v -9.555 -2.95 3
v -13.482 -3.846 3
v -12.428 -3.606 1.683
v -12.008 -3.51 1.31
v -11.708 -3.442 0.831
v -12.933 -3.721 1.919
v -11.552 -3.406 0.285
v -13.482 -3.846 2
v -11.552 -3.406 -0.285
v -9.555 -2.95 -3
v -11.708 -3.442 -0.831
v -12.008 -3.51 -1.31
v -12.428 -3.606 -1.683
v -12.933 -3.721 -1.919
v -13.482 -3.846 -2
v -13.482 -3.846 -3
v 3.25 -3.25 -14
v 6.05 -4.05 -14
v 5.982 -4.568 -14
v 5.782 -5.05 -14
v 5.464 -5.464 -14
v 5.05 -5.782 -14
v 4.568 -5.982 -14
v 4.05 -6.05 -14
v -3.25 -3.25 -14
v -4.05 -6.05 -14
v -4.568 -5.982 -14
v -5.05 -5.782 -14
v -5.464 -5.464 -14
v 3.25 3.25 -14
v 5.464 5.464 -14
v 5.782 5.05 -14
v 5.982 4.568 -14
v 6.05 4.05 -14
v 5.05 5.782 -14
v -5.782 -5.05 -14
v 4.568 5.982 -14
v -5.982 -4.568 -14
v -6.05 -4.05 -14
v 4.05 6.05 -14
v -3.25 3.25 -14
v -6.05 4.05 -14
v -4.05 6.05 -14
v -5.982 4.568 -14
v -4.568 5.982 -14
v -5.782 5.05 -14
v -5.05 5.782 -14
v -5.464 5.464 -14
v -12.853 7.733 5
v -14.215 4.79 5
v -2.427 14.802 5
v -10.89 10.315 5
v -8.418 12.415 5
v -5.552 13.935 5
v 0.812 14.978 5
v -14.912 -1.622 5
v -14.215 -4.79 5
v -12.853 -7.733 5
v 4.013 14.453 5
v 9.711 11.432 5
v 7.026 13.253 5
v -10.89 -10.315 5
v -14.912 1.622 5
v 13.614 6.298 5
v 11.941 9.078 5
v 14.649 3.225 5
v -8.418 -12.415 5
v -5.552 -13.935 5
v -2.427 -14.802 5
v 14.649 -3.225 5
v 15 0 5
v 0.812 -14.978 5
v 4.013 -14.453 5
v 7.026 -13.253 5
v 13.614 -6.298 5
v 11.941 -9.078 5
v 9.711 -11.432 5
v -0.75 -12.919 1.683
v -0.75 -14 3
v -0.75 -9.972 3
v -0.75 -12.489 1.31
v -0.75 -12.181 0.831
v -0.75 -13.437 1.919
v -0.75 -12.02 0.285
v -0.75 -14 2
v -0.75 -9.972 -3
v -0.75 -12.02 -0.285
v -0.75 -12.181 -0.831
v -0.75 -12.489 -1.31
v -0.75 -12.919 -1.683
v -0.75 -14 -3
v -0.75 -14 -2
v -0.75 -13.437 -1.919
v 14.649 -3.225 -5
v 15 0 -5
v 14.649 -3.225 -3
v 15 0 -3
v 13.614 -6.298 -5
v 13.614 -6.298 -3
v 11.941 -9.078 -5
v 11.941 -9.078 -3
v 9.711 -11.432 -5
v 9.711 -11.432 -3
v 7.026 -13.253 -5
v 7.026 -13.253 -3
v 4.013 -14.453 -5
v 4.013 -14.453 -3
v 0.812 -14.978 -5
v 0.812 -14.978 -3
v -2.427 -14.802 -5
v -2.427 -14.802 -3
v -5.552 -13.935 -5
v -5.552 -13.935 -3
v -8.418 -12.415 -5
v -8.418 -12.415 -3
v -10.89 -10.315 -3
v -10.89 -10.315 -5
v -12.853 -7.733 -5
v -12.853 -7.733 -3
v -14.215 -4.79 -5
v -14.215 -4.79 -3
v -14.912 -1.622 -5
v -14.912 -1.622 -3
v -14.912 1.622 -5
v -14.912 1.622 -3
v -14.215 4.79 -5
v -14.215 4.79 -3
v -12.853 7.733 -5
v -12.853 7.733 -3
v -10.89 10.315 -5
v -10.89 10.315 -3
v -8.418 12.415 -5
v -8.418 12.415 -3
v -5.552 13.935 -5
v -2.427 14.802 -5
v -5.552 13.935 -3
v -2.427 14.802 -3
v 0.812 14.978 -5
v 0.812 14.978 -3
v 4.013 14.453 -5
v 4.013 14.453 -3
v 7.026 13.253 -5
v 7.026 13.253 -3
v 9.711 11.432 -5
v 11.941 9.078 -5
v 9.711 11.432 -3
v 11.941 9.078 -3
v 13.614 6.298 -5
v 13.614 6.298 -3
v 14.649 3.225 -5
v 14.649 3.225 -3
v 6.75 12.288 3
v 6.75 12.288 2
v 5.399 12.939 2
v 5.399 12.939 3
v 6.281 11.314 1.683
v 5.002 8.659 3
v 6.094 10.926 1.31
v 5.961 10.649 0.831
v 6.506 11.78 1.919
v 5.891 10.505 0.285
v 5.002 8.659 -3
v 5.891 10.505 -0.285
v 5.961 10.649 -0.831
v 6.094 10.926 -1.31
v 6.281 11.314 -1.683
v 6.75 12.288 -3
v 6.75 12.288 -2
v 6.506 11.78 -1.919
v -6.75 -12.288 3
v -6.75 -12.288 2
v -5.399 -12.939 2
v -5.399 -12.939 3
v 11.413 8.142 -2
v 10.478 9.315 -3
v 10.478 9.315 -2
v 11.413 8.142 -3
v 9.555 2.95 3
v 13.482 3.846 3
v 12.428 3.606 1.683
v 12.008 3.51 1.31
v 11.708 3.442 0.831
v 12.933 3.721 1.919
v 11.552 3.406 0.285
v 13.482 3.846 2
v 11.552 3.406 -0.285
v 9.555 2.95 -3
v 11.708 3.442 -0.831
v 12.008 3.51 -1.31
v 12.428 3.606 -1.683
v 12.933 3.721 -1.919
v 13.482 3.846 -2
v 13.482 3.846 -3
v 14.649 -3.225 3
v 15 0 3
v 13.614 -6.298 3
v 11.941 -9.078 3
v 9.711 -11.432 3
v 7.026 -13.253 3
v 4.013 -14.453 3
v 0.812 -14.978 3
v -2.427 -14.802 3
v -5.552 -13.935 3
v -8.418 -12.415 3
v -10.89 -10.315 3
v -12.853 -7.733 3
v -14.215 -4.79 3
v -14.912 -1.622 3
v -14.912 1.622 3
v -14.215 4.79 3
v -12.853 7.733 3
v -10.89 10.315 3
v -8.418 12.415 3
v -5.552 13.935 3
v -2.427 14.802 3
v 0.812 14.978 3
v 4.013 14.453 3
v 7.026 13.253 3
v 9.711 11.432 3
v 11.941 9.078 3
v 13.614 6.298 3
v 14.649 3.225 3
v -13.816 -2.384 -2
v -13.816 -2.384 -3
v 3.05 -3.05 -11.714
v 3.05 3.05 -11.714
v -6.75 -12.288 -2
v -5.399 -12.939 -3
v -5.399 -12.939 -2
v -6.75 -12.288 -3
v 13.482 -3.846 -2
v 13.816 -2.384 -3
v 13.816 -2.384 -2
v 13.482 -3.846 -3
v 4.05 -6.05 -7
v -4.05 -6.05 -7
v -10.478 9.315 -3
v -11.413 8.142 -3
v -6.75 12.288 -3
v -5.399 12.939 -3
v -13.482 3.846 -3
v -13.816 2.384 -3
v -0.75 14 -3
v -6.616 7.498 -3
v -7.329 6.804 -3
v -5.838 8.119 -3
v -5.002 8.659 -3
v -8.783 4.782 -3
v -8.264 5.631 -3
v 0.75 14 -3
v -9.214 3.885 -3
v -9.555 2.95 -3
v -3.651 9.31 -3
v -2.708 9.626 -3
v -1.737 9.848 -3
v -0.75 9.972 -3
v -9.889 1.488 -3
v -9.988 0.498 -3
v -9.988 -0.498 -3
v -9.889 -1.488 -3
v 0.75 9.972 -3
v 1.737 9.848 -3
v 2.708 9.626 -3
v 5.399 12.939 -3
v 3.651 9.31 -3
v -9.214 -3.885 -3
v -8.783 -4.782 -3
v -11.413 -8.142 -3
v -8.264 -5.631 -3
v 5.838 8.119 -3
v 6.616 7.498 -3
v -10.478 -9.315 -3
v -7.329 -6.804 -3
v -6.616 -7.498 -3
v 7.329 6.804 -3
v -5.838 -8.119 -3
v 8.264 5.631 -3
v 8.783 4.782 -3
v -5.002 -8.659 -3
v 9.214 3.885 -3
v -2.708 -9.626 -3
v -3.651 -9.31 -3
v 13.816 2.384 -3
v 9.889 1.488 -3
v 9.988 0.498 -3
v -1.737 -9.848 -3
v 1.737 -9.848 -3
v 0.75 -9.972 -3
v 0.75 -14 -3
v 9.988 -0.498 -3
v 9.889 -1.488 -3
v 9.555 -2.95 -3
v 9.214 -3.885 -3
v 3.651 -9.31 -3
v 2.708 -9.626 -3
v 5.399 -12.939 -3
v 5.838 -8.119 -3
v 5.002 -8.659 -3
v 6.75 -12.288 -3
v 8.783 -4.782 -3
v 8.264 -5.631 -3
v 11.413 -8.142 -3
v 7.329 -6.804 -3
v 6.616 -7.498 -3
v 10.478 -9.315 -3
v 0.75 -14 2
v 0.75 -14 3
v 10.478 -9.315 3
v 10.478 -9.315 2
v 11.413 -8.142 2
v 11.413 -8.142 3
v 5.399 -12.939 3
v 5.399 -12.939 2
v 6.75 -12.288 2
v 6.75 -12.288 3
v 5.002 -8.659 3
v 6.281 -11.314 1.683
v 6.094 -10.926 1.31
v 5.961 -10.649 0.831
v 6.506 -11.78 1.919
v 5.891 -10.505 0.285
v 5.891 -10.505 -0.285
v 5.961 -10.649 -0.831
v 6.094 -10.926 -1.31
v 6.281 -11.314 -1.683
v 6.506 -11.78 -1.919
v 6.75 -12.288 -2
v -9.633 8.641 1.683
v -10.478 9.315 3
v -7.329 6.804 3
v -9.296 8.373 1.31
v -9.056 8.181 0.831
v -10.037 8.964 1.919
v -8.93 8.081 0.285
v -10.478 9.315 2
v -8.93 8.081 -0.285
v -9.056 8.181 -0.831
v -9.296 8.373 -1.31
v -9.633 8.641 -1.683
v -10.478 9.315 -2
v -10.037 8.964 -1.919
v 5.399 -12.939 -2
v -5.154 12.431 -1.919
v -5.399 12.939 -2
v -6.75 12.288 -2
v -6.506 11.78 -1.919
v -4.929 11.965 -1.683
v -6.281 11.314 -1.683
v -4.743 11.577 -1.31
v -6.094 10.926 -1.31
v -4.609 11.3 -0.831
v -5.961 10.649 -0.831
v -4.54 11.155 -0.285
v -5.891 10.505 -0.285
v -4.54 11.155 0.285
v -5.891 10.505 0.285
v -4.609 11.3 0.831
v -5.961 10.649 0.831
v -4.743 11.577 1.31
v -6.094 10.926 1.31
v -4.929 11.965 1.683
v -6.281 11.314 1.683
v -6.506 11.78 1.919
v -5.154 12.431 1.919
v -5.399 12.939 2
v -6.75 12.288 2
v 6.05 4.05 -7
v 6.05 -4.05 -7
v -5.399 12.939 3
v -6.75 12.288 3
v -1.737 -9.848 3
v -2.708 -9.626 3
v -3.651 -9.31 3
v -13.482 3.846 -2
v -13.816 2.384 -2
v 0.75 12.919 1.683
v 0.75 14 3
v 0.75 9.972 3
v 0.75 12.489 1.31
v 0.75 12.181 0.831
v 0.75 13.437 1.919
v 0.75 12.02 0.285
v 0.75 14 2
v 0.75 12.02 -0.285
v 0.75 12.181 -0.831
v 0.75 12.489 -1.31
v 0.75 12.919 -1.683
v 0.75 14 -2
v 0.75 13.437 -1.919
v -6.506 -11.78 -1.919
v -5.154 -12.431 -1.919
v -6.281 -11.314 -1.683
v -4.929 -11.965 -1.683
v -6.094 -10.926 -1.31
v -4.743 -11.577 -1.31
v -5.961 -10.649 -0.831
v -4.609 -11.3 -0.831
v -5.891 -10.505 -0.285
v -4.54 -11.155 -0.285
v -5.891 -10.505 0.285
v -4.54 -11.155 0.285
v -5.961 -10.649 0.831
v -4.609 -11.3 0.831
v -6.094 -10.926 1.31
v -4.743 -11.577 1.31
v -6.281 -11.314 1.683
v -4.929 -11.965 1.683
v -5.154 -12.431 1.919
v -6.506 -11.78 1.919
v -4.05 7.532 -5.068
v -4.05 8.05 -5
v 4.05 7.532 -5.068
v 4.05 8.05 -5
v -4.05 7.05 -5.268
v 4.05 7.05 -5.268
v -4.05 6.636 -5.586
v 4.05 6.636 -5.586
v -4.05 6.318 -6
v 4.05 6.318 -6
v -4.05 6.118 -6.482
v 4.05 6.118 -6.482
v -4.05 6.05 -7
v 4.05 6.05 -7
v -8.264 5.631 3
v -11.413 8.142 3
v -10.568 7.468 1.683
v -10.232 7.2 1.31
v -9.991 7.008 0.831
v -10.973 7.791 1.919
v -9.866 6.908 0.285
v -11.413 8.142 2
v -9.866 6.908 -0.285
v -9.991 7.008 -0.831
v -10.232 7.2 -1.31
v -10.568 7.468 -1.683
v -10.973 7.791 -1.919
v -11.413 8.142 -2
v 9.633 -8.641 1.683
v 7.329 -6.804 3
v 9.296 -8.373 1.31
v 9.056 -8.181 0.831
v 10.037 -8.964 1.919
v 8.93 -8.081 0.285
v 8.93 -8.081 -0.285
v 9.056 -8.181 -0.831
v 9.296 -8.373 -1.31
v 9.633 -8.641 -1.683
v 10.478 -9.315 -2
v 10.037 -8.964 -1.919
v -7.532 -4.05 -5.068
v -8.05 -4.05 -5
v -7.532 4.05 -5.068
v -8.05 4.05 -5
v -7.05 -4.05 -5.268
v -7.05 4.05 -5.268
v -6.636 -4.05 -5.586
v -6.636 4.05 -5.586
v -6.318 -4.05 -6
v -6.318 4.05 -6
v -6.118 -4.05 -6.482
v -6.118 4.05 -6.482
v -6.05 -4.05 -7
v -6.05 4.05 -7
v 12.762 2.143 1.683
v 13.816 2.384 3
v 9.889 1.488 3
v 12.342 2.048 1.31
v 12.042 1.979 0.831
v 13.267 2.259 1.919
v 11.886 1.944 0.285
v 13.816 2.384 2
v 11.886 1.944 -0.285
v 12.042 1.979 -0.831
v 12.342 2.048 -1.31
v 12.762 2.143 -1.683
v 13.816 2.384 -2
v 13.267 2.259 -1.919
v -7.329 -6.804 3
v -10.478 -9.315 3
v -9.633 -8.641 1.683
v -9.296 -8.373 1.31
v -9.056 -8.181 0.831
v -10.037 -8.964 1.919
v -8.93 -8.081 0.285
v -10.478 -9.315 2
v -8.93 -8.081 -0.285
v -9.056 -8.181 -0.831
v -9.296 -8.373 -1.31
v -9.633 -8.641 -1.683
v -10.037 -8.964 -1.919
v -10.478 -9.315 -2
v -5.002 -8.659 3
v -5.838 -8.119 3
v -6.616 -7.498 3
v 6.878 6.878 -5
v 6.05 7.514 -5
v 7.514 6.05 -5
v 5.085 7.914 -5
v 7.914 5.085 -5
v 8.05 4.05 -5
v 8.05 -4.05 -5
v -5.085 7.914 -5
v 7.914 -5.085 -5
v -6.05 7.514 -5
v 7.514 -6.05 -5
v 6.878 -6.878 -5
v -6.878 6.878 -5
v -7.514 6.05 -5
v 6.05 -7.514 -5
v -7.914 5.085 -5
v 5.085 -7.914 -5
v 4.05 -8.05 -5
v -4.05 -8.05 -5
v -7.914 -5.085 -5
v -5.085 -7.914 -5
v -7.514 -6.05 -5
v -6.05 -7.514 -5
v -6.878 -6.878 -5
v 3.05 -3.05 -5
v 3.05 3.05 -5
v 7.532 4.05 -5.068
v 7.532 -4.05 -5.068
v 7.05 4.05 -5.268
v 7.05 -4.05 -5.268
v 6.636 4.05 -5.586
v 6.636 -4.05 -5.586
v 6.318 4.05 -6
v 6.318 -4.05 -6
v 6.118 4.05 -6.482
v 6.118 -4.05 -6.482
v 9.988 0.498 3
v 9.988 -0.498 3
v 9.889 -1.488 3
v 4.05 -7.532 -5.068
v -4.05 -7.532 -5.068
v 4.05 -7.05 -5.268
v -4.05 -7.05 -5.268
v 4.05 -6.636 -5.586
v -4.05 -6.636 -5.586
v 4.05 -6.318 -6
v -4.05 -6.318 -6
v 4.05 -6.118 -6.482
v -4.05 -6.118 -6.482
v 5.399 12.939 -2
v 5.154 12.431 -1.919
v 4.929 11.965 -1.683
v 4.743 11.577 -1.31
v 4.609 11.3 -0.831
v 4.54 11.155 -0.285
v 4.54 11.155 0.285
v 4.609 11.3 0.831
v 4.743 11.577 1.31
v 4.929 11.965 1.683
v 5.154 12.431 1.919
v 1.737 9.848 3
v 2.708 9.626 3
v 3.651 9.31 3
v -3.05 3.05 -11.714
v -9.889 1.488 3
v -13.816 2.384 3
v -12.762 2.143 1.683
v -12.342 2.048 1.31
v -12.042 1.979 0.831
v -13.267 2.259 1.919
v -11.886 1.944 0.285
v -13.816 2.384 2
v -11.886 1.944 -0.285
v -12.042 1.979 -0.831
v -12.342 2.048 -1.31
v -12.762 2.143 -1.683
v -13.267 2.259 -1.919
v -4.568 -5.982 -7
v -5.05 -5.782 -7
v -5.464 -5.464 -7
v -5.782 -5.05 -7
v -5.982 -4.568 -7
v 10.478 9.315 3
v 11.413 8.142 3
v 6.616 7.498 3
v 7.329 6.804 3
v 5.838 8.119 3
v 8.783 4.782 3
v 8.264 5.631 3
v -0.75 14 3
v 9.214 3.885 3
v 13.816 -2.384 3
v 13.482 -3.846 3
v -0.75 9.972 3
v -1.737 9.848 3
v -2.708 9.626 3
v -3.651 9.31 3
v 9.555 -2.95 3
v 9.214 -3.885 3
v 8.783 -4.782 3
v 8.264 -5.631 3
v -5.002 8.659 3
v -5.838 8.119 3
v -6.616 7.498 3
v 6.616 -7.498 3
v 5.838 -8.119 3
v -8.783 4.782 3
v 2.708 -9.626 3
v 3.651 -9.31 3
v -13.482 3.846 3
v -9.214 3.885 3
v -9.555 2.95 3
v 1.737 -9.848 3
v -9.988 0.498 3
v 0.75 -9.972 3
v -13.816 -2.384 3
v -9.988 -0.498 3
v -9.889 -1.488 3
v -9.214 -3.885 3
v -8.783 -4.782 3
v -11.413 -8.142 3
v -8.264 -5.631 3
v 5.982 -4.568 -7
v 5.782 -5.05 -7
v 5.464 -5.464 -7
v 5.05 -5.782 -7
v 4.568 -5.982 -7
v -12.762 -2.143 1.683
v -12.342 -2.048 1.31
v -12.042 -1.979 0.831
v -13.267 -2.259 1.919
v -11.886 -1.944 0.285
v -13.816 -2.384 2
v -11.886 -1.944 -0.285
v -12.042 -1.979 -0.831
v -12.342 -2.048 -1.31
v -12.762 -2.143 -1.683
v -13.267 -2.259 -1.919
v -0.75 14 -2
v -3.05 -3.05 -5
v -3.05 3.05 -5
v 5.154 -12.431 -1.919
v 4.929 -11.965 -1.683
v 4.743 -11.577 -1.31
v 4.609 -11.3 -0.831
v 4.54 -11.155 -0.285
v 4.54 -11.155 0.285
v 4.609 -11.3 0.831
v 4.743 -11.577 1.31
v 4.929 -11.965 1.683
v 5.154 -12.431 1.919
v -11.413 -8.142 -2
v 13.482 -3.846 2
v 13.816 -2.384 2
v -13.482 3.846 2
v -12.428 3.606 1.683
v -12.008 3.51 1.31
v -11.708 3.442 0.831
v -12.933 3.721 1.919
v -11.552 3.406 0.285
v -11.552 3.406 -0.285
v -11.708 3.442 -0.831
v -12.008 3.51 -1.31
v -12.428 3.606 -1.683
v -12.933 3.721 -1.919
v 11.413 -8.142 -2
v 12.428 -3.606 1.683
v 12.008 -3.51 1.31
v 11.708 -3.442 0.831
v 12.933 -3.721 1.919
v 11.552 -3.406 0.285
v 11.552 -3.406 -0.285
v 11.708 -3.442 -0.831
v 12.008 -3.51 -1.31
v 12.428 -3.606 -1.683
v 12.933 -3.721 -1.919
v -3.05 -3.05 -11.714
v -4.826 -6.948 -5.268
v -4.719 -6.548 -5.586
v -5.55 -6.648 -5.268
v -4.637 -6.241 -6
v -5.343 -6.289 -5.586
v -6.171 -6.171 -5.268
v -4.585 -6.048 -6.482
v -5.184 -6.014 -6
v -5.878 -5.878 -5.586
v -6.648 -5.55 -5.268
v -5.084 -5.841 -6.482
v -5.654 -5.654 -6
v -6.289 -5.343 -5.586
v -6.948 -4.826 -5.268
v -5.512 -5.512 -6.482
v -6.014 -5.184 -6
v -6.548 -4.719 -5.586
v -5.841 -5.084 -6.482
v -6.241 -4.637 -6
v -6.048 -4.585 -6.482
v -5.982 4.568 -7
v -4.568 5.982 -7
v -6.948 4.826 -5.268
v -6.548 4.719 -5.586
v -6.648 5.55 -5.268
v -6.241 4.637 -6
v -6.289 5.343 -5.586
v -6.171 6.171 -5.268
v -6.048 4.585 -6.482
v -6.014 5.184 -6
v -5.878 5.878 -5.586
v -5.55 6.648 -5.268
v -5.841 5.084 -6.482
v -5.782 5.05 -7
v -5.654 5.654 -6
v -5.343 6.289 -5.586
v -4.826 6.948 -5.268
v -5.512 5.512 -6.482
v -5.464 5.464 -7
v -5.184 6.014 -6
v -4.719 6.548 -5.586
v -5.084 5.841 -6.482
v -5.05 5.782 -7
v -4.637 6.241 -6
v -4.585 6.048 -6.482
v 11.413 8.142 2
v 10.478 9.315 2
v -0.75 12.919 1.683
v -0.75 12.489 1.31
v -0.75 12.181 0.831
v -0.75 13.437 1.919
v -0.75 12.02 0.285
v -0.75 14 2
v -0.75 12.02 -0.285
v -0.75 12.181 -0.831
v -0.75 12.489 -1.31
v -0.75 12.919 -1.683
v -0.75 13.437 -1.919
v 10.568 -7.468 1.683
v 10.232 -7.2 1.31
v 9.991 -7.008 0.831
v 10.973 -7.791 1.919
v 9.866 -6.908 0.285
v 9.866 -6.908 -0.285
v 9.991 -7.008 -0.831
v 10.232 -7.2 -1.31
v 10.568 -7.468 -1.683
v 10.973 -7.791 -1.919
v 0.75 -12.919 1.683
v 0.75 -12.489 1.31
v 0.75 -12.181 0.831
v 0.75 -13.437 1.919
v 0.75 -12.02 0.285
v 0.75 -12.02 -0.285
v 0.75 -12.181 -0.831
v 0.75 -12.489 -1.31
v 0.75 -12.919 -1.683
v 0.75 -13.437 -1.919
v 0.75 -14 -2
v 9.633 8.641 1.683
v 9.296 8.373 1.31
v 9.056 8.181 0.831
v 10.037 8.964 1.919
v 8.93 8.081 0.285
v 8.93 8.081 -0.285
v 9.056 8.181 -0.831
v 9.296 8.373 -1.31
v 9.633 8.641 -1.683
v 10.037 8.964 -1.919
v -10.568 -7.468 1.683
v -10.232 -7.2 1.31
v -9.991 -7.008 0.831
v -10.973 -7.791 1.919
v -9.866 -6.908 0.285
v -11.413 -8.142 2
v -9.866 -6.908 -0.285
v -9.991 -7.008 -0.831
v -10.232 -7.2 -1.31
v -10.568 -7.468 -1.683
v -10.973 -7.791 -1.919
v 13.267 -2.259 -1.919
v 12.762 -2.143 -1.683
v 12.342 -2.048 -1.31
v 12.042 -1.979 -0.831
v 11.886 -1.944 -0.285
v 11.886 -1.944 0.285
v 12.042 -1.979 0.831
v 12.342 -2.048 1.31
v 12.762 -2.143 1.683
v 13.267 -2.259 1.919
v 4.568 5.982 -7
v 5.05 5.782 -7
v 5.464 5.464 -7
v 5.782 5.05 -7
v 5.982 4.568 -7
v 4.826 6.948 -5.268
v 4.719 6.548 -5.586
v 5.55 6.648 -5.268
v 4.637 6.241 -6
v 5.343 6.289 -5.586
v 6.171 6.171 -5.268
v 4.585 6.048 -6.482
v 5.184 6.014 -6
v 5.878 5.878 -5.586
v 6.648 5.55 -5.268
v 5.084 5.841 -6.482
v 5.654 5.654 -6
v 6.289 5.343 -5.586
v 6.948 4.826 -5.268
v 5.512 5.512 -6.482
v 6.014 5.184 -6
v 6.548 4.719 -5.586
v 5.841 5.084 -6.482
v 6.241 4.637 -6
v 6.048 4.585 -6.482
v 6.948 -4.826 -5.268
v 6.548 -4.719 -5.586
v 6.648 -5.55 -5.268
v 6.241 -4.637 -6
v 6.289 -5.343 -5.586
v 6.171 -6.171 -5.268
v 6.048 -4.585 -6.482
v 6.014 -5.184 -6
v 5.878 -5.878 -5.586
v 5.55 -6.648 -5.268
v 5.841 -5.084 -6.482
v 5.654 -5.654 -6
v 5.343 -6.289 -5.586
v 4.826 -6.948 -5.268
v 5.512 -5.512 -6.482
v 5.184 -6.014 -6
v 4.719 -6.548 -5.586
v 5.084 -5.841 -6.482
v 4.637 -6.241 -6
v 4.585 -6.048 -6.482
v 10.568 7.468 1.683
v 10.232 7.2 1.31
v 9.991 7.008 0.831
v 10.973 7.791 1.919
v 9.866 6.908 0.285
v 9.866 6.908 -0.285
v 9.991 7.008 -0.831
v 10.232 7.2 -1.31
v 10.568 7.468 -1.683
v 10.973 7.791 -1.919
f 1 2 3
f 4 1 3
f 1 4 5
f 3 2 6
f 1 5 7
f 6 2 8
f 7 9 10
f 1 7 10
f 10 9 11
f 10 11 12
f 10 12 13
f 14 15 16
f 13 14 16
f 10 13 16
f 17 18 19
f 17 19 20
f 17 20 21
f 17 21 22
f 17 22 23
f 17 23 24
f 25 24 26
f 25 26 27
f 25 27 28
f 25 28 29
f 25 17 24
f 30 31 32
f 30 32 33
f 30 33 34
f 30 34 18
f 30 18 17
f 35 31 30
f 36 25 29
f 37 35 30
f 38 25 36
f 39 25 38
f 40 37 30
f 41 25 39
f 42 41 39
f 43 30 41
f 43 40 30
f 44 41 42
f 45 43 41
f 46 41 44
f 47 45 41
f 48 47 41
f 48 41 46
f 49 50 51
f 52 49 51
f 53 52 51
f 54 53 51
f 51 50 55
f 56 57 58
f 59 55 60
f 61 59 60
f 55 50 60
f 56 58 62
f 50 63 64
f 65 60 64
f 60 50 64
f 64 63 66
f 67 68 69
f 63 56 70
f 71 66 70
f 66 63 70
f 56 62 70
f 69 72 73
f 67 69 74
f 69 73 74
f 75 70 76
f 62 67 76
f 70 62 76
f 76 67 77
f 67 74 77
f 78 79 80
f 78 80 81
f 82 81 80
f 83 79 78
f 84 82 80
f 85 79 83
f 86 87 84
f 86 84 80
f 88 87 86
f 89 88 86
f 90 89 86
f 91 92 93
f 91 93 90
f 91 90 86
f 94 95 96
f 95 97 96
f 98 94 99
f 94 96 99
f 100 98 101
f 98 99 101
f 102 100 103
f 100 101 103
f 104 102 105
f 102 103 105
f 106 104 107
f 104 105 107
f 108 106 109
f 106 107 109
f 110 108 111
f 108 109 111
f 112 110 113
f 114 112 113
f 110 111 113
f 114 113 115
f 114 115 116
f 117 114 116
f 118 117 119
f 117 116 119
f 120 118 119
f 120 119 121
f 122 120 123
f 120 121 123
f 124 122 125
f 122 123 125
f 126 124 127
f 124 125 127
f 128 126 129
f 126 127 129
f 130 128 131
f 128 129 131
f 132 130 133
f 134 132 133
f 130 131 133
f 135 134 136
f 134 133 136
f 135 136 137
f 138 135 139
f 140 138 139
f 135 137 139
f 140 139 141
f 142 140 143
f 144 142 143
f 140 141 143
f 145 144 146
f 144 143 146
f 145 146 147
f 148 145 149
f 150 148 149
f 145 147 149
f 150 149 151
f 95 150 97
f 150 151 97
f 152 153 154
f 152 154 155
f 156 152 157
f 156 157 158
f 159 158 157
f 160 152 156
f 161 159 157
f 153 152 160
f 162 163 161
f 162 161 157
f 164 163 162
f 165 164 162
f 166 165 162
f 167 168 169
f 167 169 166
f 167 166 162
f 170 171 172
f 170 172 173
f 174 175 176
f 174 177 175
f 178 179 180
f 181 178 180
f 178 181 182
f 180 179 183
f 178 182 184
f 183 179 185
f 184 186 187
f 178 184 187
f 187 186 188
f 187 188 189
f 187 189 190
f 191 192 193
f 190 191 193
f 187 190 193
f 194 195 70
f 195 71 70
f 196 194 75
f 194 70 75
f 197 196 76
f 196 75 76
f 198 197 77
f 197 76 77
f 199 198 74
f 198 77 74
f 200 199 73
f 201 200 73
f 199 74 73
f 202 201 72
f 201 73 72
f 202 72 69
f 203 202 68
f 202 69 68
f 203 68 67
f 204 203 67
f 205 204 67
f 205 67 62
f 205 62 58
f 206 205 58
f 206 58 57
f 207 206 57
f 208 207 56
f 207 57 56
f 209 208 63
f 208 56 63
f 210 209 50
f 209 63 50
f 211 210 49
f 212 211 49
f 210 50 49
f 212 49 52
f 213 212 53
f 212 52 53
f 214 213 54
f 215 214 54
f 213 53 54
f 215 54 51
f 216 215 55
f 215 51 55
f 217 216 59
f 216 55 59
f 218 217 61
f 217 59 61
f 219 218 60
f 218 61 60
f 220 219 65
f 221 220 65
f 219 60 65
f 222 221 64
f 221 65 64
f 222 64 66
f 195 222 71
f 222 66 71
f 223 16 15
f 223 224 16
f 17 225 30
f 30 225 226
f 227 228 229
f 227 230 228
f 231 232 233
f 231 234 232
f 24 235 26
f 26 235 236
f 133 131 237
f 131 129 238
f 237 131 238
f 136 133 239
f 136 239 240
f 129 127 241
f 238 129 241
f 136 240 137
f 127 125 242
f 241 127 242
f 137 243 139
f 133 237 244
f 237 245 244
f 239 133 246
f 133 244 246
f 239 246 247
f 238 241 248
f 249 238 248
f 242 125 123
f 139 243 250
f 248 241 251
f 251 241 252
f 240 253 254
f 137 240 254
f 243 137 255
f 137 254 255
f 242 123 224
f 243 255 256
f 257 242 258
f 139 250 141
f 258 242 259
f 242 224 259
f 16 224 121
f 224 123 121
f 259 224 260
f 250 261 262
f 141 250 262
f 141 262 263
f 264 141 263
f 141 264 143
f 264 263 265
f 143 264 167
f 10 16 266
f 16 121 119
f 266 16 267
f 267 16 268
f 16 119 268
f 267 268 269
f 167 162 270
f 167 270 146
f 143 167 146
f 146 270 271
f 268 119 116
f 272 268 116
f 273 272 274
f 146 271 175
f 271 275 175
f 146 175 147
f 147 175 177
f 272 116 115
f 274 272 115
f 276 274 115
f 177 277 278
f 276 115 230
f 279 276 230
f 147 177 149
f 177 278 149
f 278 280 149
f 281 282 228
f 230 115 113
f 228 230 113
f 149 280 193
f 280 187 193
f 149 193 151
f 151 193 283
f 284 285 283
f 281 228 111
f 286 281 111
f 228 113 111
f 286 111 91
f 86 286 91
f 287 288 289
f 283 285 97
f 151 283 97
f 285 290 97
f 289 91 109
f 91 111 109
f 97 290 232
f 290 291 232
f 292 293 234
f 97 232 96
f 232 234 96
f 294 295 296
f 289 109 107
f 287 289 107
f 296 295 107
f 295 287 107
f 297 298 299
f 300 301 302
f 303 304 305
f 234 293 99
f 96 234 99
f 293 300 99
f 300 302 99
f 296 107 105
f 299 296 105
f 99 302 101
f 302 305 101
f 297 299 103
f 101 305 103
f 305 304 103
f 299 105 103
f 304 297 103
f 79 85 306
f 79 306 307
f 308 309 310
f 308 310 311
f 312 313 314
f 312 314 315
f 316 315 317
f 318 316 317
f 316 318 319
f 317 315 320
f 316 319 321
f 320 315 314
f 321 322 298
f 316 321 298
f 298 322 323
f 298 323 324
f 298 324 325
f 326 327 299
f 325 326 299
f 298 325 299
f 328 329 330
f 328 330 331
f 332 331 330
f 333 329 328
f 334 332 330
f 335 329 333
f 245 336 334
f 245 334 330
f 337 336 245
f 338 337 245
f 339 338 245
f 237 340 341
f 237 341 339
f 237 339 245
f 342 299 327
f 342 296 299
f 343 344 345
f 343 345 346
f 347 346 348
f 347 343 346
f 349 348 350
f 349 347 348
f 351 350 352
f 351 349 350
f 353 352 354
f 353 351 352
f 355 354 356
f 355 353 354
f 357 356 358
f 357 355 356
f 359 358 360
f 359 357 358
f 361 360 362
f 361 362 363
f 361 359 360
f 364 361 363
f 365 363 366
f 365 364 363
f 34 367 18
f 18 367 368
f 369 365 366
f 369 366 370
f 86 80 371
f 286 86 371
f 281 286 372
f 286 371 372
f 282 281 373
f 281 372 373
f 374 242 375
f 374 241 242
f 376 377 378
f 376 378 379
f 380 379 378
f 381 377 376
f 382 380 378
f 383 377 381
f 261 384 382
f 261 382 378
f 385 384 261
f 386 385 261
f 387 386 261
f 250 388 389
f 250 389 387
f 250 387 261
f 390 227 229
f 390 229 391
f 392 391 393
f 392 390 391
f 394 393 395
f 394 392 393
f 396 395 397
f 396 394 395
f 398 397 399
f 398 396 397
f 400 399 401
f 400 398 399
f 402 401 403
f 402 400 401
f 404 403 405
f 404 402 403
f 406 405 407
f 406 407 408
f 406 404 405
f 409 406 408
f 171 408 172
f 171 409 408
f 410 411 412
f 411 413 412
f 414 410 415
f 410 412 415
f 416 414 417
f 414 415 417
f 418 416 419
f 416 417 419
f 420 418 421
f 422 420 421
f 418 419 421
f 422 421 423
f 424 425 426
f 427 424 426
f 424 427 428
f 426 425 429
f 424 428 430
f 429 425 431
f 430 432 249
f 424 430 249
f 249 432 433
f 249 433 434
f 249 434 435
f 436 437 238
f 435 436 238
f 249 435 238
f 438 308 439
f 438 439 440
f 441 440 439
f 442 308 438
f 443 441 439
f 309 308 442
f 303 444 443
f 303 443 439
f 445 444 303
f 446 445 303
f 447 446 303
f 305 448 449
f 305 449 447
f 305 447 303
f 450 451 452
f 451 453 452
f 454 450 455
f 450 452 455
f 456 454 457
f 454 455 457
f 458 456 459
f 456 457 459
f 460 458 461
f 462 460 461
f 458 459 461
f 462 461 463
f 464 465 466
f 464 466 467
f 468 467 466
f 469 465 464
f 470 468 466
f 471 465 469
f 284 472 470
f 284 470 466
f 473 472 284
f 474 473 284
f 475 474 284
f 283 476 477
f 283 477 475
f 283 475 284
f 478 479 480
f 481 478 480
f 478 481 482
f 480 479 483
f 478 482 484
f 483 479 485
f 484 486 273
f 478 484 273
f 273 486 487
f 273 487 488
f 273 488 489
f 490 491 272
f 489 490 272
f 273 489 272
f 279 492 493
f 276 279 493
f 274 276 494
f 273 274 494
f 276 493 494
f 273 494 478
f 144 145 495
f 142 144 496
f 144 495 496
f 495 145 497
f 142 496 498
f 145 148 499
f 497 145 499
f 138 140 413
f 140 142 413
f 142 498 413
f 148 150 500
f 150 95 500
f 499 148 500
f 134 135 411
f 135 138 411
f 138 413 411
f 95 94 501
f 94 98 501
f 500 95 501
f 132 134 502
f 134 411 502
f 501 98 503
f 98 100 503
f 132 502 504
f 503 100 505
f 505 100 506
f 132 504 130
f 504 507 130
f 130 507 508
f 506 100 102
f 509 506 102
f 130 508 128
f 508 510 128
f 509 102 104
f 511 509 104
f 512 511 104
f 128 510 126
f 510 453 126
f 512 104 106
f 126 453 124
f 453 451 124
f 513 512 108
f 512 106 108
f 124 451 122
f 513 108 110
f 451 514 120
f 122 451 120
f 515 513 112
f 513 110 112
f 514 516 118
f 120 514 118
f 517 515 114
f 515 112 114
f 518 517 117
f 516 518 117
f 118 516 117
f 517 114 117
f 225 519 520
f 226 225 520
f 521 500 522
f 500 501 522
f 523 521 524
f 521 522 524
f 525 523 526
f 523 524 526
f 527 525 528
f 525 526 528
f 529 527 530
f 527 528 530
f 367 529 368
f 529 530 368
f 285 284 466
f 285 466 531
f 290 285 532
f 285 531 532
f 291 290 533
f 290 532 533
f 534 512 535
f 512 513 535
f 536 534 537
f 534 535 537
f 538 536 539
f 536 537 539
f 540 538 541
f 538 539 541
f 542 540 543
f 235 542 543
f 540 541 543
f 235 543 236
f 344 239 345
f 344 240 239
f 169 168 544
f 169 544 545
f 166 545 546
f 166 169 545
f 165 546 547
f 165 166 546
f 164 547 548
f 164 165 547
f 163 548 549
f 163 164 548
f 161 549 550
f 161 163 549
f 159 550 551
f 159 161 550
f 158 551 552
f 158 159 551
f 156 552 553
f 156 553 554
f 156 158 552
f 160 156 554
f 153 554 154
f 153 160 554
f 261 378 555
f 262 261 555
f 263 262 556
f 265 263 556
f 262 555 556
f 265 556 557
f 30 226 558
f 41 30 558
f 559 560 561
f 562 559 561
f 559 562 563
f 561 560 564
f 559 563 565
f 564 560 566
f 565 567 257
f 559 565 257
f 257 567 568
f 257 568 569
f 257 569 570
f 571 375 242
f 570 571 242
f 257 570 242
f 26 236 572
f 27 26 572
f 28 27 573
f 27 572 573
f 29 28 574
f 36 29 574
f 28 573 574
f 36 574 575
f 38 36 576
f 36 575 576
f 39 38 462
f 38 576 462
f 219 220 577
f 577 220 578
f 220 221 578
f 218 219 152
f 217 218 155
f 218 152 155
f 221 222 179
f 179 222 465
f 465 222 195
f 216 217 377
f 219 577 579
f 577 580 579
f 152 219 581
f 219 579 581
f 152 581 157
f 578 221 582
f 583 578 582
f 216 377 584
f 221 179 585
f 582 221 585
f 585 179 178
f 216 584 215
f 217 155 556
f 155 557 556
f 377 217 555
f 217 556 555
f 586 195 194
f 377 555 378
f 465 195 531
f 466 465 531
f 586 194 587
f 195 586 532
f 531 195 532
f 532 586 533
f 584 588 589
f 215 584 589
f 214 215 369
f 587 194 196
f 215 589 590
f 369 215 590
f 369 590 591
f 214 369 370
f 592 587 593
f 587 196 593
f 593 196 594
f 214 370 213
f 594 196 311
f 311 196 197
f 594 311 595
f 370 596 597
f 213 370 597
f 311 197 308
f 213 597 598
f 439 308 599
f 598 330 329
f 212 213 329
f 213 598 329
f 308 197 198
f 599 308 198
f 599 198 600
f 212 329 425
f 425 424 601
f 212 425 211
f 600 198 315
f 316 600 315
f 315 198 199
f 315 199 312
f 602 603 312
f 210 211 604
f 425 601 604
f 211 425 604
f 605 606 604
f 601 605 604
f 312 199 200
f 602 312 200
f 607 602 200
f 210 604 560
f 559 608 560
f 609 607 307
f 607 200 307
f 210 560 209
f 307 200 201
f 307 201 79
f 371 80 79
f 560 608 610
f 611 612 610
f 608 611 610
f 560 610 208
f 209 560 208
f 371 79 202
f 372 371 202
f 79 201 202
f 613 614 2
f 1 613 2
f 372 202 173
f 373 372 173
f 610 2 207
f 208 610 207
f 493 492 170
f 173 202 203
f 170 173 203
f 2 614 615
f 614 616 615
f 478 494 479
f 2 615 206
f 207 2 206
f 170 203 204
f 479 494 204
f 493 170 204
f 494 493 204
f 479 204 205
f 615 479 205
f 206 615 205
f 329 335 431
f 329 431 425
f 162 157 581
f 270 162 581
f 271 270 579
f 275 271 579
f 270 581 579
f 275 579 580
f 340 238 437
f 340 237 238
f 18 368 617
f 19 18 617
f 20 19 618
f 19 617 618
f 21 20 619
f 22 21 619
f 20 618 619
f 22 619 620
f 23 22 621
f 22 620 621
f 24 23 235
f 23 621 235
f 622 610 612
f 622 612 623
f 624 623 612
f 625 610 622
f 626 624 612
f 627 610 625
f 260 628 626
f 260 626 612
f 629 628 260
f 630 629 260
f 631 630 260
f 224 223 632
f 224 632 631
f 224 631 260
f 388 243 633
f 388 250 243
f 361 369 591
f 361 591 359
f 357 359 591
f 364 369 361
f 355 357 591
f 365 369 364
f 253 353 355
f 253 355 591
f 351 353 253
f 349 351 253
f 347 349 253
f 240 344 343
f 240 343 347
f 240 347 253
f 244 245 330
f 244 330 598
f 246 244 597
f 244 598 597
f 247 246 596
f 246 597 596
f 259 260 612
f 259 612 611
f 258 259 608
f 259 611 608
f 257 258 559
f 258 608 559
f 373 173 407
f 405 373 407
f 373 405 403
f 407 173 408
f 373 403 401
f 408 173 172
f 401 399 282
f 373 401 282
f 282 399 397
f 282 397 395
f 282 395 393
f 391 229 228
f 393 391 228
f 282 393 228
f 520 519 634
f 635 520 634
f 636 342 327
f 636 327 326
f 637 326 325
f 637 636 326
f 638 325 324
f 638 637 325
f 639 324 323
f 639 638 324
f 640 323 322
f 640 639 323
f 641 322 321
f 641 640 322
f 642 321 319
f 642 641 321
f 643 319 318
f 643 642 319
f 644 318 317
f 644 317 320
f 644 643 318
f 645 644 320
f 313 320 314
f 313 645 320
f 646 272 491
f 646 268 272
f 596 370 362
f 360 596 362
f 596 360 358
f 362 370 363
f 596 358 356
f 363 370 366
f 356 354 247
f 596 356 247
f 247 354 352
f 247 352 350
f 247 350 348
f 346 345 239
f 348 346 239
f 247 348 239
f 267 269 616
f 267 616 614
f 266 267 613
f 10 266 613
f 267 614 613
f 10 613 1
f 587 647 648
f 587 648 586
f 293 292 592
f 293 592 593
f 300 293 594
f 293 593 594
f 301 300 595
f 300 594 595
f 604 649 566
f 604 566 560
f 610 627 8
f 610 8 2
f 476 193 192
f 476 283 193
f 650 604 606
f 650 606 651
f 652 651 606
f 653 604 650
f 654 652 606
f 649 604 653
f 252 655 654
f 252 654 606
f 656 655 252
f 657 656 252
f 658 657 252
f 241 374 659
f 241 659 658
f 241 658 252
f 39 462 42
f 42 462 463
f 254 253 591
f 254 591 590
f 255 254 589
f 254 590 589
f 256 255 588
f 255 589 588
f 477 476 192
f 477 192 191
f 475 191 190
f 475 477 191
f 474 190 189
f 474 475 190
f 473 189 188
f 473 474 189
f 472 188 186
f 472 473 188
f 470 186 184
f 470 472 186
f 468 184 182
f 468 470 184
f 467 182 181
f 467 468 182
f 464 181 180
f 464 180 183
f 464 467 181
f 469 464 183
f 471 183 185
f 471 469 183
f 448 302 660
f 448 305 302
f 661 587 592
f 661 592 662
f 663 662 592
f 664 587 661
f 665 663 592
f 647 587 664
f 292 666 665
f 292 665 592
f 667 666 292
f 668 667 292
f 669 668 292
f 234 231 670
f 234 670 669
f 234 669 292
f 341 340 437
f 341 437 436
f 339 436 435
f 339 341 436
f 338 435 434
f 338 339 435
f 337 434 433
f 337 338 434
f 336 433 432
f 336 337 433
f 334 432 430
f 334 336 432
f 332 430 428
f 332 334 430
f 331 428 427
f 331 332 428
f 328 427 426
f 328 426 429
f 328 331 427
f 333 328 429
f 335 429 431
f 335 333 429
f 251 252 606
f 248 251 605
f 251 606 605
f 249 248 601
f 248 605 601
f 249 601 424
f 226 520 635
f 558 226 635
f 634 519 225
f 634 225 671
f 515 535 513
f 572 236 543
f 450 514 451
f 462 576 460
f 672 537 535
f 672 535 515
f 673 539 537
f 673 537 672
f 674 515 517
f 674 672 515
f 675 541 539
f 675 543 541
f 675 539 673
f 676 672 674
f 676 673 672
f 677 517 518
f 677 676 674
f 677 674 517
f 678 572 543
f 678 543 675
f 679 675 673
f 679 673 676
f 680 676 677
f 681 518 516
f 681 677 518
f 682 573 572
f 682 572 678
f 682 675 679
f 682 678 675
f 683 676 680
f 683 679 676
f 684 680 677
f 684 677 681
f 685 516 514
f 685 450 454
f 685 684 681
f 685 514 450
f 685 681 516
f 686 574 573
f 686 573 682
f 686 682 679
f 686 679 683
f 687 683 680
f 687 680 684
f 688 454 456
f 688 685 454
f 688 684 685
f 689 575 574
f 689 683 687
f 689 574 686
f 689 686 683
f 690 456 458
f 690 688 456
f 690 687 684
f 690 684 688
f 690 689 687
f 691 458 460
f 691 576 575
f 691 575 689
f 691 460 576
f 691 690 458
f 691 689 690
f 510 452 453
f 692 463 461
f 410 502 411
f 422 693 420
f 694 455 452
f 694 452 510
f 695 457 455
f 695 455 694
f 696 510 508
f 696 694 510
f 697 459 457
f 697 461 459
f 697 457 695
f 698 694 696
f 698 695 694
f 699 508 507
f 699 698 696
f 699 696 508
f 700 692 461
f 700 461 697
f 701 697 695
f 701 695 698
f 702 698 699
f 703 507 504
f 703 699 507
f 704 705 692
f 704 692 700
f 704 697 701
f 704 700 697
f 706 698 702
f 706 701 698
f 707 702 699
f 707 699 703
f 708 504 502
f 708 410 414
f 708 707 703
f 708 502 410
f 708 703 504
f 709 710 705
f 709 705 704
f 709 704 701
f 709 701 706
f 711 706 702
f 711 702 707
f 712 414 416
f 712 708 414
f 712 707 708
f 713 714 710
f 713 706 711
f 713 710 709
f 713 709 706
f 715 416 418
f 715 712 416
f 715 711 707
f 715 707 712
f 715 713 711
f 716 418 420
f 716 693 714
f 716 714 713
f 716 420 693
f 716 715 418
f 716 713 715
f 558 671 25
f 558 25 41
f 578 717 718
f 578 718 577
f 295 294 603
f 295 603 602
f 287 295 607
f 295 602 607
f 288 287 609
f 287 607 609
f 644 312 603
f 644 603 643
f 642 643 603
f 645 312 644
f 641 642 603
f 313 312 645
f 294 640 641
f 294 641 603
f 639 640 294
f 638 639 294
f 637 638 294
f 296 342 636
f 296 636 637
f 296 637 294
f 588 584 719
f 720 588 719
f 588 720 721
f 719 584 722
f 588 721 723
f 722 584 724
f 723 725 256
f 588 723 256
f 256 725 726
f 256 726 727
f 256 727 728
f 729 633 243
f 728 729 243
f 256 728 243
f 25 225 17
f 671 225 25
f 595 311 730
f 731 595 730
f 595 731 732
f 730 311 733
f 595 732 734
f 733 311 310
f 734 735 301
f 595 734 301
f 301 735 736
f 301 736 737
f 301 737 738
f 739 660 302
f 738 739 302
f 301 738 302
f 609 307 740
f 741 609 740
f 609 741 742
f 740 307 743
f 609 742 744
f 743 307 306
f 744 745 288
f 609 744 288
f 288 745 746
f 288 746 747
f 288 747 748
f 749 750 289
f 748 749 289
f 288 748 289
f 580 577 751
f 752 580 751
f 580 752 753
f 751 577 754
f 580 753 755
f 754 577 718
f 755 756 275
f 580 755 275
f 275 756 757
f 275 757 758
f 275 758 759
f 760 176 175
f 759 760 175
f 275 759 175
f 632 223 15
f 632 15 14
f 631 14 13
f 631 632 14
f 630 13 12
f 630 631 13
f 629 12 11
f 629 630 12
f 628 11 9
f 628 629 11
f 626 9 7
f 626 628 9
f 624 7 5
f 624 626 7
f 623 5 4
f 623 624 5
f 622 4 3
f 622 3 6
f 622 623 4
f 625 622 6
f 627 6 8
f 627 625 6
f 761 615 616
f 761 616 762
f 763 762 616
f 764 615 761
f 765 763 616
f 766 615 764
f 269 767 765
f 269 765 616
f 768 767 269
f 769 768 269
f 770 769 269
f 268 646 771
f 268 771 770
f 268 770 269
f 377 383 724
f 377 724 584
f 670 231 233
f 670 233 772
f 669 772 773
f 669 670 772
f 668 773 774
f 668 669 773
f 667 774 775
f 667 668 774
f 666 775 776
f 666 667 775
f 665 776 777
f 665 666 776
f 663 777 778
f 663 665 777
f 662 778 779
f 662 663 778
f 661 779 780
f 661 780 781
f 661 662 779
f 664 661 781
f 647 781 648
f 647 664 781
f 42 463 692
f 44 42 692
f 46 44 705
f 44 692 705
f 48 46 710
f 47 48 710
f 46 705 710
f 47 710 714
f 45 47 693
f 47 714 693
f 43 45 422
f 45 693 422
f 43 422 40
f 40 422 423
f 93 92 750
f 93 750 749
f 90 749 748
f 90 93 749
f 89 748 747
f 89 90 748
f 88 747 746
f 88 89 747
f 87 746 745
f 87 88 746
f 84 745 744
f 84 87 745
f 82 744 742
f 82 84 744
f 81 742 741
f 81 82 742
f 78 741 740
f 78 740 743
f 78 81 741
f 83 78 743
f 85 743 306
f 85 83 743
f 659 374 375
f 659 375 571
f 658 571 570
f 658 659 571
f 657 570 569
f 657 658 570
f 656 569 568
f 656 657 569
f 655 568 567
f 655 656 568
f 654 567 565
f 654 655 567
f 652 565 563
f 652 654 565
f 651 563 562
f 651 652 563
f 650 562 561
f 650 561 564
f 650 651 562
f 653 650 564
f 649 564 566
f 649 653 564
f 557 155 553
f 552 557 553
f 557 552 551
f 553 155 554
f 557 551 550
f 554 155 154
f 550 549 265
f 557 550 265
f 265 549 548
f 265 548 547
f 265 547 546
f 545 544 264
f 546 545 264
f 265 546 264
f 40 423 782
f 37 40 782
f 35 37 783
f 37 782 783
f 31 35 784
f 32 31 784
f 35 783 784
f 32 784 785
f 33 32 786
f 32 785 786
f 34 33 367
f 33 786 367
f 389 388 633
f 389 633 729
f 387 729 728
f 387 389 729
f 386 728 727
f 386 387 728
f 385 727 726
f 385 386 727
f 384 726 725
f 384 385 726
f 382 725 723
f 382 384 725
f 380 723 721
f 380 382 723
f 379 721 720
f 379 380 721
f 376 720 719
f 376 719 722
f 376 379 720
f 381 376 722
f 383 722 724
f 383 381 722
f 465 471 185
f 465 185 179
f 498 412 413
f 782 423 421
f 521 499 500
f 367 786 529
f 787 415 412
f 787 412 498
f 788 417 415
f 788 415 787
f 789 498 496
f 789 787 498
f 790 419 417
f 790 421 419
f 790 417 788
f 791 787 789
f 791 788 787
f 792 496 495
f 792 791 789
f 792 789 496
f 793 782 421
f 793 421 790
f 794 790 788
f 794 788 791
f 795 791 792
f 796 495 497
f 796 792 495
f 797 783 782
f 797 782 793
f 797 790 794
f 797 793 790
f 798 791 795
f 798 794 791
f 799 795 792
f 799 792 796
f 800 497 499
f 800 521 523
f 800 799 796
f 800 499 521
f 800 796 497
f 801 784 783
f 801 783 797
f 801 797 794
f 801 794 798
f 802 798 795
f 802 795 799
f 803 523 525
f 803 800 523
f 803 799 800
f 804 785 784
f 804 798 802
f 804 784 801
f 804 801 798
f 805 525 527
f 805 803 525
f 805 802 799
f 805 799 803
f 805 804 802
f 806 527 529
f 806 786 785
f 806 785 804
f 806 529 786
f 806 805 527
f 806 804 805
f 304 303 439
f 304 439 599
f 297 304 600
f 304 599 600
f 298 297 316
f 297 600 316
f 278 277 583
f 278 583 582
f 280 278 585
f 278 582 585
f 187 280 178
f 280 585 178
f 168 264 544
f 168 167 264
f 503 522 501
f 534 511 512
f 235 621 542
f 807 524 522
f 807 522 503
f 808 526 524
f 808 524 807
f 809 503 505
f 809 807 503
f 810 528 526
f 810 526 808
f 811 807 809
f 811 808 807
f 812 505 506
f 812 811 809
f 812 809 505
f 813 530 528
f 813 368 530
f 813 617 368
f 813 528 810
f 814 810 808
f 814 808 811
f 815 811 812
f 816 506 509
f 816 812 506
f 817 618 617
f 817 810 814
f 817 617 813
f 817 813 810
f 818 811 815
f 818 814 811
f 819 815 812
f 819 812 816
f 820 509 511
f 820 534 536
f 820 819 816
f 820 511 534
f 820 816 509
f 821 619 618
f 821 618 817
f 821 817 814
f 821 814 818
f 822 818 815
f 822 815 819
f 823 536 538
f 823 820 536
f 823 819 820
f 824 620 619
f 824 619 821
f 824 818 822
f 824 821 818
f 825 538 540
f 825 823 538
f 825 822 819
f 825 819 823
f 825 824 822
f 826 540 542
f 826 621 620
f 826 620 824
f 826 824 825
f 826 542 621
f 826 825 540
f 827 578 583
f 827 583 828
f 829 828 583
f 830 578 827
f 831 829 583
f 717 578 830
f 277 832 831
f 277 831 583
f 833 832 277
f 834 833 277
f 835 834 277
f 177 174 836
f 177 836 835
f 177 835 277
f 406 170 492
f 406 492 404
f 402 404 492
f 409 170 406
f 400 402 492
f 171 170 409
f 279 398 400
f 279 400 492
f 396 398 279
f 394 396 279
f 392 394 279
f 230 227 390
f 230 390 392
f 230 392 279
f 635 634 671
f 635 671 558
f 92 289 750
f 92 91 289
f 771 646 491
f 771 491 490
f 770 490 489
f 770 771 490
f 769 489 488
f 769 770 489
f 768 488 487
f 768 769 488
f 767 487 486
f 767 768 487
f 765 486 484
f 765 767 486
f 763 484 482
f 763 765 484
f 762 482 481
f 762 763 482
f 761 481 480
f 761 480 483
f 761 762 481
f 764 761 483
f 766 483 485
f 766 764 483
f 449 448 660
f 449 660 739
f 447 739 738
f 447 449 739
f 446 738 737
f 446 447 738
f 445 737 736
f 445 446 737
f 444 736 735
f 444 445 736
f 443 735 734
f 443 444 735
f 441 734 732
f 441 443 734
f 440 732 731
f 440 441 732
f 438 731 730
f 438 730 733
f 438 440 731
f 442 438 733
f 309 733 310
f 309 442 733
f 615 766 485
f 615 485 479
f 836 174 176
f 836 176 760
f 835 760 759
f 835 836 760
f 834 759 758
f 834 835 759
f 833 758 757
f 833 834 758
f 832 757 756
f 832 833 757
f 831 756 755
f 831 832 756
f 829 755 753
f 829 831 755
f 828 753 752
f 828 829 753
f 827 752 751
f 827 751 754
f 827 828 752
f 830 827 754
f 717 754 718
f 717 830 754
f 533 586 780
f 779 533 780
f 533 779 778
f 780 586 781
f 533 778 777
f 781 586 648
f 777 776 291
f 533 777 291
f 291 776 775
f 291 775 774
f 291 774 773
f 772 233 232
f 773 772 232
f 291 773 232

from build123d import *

# Parameters (mm, degrees)
EXTRUDE_1_DEPTH          = 0.75
PATTERN_CIRCULAR_1_COUNT = 14
SKETCH_3_W               = 6.1
SKETCH_3_H               = 6.1
EXTRUDE_2_DEPTH          = 9
FILLET_1_R               = 2
CHAMFER_1_SIZE           = 0.2
CHAMFER_1_SIZE2          = 2.286010461


with BuildPart() as part:
    # 草圖1 → 旋轉1 (revolve)
    with BuildSketch(Plane(origin=(0, 0, 0), x_dir=(0, 0, -1), z_dir=(1, 0, 0))):
        Polygon((-5, 0), (5, 0), (5, 15), (3, 15), (3, 10), (-3, 10), (-3, 15), (-5, 15), align=None)
    revolve(axis=Axis((0, 0, 5), (0, 0, -1)))

    # 草圖2 → 填料-伸長1 (add, symmetric)
    with BuildSketch(Plane(origin=(0, 0, 0), x_dir=(0, 0, -1), z_dir=(1, 0, 0))):
        with BuildLine():
            Line((3, 10), (3, 14))
            Line((3, 14), (2, 14))
            ThreePointArc((2, 14), (0, 12), (-2, 14))
            Line((-2, 14), (-3, 14))
            Line((-3, 14), (-3, 10))
            Line((-3, 10), (-3, 8.5))
            Line((-3, 8.5), (3, 8.5))
            Line((3, 8.5), (3, 10))
        make_face()
    extrude_1 = extrude(amount=EXTRUDE_1_DEPTH, both=True)

    # 環狀複製排列1: 填料-伸長1 ×14 about axis
    pattern_circular_1_axis = Axis((0, 0, 5.5), (0, 0, -1))
    for i in range(1, PATTERN_CIRCULAR_1_COUNT):
        add(extrude_1.rotate(pattern_circular_1_axis, i * 360 / PATTERN_CIRCULAR_1_COUNT))

    # 草圖3 → 填料-伸長2 (add)
    with BuildSketch(Plane(origin=(0, 0, -5), x_dir=(-1, 0, 0), z_dir=(0, 0, -1))):
        with BuildLine():
            Line((-4.05, -6.05), (4.05, -6.05))
            ThreePointArc((4.05, -6.05), (5.464213562, -5.464213562), (6.05, -4.05))
            Line((6.05, -4.05), (6.05, 4.05))
            ThreePointArc((6.05, 4.05), (5.464213562, 5.464213562), (4.05, 6.05))
            Line((4.05, 6.05), (-4.05, 6.05))
            ThreePointArc((-4.05, 6.05), (-5.464213562, 5.464213562), (-6.05, 4.05))
            Line((-6.05, 4.05), (-6.05, -4.05))
            ThreePointArc((-6.05, -4.05), (-5.464213562, -5.464213562), (-4.05, -6.05))
        make_face()
        Rectangle(SKETCH_3_W, SKETCH_3_H, mode=Mode.SUBTRACT)
    extrude(amount=EXTRUDE_2_DEPTH)

    # 圓角1
    fillet_1_edges = [part.edges().sort_by_distance(p)[0] for p in [
        (0, 6.05, -5),
        (-5.464213562, 5.464213562, -5),
        (-6.05, 0, -5),
        (-5.464213562, -5.464213562, -5),
        (0, -6.05, -5),
        (5.464213562, -5.464213562, -5),
        (6.05, 0, -5),
        (5.464213562, 5.464213562, -5),
    ]]
    fillet(fillet_1_edges, radius=FILLET_1_R)

    # 導角1
    chamfer_1_edges = [part.edges().sort_by_distance(p)[0] for p in [
        (0, -3.05, -14),
        (-3.05, 0, -14),
        (0, 3.05, -14),
        (3.05, 0, -14),
    ]]
    chamfer_1_side = [part.faces().sort_by_distance(p)[0] for p in [
        (5.343213562, -5.343213562, -14),
    ]]
    chamfer(chamfer_1_edges, length=CHAMFER_1_SIZE, length2=CHAMFER_1_SIZE2, reference=chamfer_1_side[0])


solid = part.part
